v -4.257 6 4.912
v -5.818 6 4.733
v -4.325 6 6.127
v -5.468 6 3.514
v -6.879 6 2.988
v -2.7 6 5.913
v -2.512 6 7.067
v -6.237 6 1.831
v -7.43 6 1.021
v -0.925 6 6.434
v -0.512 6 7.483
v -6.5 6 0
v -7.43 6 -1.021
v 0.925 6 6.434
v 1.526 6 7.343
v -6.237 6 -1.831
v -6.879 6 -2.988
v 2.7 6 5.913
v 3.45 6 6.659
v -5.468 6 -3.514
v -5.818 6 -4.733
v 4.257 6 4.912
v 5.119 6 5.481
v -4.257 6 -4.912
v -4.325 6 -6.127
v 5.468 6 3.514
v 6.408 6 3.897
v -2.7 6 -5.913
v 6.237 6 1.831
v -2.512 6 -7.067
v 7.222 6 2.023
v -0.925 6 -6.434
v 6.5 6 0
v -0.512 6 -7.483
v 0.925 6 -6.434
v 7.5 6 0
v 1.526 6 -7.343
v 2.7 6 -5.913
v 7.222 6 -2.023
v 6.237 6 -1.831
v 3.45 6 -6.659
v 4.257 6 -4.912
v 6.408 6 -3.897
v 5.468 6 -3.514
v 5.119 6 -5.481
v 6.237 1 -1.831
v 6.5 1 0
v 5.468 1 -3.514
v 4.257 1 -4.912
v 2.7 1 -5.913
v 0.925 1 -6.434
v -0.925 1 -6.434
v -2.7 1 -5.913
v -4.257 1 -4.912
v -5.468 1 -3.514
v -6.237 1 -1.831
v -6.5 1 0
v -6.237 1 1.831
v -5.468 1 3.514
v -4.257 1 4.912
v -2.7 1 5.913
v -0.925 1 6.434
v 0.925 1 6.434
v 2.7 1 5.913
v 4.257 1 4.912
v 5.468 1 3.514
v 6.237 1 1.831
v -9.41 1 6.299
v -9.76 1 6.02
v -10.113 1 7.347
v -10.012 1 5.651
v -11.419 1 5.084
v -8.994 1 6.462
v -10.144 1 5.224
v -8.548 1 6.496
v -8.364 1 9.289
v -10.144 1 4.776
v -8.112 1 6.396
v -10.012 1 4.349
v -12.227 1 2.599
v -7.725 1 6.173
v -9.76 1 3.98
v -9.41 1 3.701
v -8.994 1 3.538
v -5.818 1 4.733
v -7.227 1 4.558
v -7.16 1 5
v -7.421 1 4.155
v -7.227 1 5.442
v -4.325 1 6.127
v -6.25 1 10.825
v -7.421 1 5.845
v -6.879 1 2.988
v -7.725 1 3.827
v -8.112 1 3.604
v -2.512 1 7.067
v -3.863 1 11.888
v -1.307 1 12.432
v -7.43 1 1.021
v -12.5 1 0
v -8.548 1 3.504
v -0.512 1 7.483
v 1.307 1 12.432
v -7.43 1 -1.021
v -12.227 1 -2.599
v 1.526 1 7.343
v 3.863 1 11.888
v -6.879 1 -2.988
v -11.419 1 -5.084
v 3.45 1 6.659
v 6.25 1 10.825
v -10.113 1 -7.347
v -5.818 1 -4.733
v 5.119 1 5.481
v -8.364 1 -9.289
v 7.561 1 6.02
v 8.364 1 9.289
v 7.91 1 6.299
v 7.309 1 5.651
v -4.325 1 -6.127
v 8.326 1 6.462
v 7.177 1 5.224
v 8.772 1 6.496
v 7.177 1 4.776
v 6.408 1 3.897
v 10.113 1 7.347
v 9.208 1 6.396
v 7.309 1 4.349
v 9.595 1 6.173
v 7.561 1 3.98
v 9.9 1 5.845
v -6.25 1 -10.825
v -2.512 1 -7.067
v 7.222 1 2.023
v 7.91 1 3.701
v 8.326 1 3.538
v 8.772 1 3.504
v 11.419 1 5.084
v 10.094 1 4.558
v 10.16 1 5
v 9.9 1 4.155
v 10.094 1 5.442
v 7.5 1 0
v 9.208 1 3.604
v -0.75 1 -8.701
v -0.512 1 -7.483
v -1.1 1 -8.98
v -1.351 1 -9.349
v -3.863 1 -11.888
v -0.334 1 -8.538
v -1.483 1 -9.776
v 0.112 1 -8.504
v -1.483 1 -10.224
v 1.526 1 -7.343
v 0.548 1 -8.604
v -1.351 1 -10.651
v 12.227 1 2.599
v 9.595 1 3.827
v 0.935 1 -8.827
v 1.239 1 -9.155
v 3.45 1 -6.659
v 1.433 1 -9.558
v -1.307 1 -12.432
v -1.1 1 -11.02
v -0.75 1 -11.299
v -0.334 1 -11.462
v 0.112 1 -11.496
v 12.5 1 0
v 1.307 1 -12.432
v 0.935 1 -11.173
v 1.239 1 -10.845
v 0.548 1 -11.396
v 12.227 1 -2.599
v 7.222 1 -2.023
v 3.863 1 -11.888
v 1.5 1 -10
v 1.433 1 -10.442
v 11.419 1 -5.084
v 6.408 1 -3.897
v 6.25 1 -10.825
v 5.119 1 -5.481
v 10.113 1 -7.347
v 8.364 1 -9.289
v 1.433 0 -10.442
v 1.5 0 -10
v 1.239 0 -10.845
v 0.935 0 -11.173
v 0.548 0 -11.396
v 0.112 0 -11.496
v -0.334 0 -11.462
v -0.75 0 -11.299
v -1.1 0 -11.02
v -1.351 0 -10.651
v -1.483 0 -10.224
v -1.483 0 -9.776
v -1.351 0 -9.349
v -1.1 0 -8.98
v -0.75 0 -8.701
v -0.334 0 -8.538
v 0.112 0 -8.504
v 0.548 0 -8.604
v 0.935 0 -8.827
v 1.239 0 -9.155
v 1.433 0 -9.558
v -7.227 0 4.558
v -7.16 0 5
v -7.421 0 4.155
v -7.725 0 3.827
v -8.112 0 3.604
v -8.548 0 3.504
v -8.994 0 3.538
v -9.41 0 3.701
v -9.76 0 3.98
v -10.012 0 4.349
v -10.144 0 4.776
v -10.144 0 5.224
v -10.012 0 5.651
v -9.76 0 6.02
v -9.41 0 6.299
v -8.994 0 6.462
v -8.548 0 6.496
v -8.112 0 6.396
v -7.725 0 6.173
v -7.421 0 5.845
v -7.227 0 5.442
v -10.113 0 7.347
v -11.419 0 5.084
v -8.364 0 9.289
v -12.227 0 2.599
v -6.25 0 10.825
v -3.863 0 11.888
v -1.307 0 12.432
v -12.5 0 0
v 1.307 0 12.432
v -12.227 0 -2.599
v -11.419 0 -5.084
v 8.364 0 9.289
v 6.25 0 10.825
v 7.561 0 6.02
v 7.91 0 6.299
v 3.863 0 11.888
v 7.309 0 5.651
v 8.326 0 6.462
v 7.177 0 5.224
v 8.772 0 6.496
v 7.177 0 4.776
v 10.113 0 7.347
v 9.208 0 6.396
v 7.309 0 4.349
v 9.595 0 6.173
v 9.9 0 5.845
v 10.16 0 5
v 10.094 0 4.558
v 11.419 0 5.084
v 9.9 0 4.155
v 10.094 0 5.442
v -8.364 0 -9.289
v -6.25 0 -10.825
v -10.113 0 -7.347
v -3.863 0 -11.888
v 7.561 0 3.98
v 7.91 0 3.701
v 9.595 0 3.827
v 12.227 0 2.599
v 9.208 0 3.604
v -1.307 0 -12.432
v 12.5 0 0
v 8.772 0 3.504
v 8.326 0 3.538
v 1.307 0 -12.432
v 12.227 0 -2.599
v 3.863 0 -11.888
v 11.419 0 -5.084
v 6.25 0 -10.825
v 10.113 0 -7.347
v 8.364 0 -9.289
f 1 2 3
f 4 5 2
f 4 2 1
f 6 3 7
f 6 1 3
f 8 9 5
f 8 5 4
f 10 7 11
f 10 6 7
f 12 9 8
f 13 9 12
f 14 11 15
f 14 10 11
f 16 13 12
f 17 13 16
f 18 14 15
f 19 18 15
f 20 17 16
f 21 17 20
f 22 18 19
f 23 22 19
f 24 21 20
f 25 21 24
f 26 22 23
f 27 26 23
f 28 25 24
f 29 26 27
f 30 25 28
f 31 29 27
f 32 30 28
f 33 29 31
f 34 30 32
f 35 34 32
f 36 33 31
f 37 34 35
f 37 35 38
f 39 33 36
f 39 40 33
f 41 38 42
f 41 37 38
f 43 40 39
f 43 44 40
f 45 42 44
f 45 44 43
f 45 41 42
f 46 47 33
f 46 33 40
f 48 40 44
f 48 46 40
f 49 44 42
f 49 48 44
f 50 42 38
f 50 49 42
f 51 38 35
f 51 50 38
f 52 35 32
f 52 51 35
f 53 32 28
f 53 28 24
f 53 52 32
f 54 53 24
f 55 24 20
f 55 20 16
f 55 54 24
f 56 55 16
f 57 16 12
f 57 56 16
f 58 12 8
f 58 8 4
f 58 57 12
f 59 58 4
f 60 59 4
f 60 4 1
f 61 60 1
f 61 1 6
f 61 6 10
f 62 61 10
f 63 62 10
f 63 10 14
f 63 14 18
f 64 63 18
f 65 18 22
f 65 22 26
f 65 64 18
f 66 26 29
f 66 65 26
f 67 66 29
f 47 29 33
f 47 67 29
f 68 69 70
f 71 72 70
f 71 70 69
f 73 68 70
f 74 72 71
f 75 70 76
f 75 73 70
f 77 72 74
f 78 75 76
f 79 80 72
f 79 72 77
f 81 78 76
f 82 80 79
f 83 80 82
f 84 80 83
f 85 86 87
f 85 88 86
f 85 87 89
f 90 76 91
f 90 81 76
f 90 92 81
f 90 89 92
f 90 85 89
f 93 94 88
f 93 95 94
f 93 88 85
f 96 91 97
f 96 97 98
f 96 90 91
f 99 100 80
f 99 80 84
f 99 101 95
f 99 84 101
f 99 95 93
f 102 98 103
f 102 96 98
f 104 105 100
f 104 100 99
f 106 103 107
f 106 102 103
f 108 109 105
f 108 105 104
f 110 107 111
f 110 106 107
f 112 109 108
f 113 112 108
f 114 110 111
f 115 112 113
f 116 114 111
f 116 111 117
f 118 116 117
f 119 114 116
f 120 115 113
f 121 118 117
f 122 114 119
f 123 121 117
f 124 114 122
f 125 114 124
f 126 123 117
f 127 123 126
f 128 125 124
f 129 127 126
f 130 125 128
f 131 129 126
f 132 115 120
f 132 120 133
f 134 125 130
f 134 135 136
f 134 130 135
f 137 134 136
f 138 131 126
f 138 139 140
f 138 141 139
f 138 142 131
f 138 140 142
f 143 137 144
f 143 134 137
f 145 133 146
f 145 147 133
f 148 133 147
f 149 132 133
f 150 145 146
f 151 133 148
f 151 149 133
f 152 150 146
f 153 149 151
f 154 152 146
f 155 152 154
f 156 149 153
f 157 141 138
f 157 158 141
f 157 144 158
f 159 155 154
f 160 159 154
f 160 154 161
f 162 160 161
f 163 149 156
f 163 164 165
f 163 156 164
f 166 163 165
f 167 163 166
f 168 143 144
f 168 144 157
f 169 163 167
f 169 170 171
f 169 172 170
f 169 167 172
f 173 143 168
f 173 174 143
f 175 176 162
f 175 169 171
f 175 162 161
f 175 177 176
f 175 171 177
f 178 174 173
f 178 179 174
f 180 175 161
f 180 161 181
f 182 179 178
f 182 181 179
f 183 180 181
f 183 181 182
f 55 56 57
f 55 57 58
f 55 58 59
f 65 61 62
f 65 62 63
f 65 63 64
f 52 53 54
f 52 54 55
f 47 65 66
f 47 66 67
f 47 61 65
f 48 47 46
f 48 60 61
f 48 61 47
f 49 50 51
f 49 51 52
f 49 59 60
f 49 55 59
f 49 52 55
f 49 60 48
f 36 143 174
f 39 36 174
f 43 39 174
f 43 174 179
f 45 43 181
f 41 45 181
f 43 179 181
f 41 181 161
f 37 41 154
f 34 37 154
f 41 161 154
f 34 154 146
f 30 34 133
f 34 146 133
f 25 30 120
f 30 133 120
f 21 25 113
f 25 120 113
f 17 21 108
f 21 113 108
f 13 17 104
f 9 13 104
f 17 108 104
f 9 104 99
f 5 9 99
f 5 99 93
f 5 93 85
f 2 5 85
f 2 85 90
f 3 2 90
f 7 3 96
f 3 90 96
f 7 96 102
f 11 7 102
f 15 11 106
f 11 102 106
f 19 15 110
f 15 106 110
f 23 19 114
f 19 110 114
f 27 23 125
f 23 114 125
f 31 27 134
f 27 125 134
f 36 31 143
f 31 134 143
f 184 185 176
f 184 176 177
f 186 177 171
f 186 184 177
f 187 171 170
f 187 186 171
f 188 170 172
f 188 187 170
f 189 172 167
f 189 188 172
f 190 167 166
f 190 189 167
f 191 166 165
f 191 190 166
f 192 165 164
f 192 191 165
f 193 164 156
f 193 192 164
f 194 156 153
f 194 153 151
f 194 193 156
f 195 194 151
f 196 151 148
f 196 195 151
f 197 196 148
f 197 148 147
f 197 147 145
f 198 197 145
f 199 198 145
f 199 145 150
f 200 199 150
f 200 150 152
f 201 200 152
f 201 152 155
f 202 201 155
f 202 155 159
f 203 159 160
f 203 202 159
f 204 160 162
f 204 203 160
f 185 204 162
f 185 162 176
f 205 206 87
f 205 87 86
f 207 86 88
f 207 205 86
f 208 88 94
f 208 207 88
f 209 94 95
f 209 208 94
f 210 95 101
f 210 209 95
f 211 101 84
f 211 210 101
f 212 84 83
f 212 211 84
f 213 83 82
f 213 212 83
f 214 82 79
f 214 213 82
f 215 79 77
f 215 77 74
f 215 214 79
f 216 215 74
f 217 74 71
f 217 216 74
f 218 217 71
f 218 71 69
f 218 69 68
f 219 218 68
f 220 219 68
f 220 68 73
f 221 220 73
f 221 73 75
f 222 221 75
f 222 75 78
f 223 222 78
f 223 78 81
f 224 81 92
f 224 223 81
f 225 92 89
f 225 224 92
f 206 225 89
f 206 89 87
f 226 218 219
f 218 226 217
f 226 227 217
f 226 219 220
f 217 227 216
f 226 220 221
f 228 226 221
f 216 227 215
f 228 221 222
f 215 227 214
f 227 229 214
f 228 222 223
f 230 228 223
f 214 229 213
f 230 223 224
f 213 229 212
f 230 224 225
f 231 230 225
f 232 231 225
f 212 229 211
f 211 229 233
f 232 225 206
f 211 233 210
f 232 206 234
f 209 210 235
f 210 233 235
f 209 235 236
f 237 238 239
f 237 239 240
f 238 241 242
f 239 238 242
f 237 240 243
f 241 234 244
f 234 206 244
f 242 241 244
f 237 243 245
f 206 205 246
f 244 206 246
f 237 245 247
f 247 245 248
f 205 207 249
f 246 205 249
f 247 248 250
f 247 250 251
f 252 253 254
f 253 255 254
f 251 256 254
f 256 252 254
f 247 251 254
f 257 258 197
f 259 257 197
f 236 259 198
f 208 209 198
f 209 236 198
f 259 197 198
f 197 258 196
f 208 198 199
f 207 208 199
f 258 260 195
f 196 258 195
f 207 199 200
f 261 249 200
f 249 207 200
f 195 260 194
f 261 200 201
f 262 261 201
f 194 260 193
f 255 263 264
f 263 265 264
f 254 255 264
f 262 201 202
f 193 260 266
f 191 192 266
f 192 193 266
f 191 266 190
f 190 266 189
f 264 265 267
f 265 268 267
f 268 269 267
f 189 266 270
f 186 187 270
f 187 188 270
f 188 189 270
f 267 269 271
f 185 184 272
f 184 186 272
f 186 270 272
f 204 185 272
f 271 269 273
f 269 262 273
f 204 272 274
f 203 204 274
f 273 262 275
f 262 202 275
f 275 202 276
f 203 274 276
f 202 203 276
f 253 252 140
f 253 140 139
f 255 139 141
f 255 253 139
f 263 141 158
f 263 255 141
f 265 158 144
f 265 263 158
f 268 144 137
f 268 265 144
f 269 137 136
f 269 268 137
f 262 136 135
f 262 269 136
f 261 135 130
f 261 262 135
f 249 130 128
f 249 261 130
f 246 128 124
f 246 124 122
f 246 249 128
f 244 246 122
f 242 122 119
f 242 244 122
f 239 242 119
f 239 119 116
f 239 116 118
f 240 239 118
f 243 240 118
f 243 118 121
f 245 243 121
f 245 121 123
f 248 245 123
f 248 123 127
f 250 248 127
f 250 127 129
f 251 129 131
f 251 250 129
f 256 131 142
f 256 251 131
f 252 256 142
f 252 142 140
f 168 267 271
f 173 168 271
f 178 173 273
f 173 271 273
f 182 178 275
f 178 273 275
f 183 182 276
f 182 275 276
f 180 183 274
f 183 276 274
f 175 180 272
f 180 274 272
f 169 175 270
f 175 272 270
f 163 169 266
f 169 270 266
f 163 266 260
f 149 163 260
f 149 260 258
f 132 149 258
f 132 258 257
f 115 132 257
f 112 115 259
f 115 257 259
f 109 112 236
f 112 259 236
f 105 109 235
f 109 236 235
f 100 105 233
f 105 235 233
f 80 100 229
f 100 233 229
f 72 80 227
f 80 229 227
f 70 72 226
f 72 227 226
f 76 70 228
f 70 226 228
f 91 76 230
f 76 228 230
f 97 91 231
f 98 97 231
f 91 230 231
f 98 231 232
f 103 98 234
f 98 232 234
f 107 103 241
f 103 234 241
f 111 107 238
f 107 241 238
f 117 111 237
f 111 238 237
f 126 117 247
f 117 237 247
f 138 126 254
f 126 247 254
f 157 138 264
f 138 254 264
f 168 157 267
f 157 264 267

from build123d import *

# Parameters (mm, degrees)
SKETCH2_R           = 12.5
SKETCH2_R_2         = 1.5
BOSS_EXTRUDE1_DEPTH = 1
SKETCH3_R           = 7.5
SKETCH3_R_2         = 6.5
BOSS_EXTRUDE2_DEPTH = 5


with BuildPart() as part:
    # Sketch2 → Boss-Extrude1 (new body)
    with BuildSketch(Plane(origin=(0, 0, 0), x_dir=(1, 0, 0), z_dir=(0, 1, 0))):
        Circle(SKETCH2_R)
        with Locations((0, 10)):
            Circle(SKETCH2_R_2, mode=Mode.SUBTRACT)
        with Locations((8.660254038, -5)):
            Circle(SKETCH2_R_2, mode=Mode.SUBTRACT)
        with Locations((-8.660254038, -5)):
            Circle(SKETCH2_R_2, mode=Mode.SUBTRACT)
    extrude(amount=BOSS_EXTRUDE1_DEPTH)

    # Sketch3 → Boss-Extrude2 (add)
    with BuildSketch(Plane(origin=(0, 1, 0), x_dir=(1, 0, 0), z_dir=(0, 1, 0))):
        Circle(SKETCH3_R)
        Circle(SKETCH3_R_2, mode=Mode.SUBTRACT)
    extrude(amount=BOSS_EXTRUDE2_DEPTH)


solid = part.part
